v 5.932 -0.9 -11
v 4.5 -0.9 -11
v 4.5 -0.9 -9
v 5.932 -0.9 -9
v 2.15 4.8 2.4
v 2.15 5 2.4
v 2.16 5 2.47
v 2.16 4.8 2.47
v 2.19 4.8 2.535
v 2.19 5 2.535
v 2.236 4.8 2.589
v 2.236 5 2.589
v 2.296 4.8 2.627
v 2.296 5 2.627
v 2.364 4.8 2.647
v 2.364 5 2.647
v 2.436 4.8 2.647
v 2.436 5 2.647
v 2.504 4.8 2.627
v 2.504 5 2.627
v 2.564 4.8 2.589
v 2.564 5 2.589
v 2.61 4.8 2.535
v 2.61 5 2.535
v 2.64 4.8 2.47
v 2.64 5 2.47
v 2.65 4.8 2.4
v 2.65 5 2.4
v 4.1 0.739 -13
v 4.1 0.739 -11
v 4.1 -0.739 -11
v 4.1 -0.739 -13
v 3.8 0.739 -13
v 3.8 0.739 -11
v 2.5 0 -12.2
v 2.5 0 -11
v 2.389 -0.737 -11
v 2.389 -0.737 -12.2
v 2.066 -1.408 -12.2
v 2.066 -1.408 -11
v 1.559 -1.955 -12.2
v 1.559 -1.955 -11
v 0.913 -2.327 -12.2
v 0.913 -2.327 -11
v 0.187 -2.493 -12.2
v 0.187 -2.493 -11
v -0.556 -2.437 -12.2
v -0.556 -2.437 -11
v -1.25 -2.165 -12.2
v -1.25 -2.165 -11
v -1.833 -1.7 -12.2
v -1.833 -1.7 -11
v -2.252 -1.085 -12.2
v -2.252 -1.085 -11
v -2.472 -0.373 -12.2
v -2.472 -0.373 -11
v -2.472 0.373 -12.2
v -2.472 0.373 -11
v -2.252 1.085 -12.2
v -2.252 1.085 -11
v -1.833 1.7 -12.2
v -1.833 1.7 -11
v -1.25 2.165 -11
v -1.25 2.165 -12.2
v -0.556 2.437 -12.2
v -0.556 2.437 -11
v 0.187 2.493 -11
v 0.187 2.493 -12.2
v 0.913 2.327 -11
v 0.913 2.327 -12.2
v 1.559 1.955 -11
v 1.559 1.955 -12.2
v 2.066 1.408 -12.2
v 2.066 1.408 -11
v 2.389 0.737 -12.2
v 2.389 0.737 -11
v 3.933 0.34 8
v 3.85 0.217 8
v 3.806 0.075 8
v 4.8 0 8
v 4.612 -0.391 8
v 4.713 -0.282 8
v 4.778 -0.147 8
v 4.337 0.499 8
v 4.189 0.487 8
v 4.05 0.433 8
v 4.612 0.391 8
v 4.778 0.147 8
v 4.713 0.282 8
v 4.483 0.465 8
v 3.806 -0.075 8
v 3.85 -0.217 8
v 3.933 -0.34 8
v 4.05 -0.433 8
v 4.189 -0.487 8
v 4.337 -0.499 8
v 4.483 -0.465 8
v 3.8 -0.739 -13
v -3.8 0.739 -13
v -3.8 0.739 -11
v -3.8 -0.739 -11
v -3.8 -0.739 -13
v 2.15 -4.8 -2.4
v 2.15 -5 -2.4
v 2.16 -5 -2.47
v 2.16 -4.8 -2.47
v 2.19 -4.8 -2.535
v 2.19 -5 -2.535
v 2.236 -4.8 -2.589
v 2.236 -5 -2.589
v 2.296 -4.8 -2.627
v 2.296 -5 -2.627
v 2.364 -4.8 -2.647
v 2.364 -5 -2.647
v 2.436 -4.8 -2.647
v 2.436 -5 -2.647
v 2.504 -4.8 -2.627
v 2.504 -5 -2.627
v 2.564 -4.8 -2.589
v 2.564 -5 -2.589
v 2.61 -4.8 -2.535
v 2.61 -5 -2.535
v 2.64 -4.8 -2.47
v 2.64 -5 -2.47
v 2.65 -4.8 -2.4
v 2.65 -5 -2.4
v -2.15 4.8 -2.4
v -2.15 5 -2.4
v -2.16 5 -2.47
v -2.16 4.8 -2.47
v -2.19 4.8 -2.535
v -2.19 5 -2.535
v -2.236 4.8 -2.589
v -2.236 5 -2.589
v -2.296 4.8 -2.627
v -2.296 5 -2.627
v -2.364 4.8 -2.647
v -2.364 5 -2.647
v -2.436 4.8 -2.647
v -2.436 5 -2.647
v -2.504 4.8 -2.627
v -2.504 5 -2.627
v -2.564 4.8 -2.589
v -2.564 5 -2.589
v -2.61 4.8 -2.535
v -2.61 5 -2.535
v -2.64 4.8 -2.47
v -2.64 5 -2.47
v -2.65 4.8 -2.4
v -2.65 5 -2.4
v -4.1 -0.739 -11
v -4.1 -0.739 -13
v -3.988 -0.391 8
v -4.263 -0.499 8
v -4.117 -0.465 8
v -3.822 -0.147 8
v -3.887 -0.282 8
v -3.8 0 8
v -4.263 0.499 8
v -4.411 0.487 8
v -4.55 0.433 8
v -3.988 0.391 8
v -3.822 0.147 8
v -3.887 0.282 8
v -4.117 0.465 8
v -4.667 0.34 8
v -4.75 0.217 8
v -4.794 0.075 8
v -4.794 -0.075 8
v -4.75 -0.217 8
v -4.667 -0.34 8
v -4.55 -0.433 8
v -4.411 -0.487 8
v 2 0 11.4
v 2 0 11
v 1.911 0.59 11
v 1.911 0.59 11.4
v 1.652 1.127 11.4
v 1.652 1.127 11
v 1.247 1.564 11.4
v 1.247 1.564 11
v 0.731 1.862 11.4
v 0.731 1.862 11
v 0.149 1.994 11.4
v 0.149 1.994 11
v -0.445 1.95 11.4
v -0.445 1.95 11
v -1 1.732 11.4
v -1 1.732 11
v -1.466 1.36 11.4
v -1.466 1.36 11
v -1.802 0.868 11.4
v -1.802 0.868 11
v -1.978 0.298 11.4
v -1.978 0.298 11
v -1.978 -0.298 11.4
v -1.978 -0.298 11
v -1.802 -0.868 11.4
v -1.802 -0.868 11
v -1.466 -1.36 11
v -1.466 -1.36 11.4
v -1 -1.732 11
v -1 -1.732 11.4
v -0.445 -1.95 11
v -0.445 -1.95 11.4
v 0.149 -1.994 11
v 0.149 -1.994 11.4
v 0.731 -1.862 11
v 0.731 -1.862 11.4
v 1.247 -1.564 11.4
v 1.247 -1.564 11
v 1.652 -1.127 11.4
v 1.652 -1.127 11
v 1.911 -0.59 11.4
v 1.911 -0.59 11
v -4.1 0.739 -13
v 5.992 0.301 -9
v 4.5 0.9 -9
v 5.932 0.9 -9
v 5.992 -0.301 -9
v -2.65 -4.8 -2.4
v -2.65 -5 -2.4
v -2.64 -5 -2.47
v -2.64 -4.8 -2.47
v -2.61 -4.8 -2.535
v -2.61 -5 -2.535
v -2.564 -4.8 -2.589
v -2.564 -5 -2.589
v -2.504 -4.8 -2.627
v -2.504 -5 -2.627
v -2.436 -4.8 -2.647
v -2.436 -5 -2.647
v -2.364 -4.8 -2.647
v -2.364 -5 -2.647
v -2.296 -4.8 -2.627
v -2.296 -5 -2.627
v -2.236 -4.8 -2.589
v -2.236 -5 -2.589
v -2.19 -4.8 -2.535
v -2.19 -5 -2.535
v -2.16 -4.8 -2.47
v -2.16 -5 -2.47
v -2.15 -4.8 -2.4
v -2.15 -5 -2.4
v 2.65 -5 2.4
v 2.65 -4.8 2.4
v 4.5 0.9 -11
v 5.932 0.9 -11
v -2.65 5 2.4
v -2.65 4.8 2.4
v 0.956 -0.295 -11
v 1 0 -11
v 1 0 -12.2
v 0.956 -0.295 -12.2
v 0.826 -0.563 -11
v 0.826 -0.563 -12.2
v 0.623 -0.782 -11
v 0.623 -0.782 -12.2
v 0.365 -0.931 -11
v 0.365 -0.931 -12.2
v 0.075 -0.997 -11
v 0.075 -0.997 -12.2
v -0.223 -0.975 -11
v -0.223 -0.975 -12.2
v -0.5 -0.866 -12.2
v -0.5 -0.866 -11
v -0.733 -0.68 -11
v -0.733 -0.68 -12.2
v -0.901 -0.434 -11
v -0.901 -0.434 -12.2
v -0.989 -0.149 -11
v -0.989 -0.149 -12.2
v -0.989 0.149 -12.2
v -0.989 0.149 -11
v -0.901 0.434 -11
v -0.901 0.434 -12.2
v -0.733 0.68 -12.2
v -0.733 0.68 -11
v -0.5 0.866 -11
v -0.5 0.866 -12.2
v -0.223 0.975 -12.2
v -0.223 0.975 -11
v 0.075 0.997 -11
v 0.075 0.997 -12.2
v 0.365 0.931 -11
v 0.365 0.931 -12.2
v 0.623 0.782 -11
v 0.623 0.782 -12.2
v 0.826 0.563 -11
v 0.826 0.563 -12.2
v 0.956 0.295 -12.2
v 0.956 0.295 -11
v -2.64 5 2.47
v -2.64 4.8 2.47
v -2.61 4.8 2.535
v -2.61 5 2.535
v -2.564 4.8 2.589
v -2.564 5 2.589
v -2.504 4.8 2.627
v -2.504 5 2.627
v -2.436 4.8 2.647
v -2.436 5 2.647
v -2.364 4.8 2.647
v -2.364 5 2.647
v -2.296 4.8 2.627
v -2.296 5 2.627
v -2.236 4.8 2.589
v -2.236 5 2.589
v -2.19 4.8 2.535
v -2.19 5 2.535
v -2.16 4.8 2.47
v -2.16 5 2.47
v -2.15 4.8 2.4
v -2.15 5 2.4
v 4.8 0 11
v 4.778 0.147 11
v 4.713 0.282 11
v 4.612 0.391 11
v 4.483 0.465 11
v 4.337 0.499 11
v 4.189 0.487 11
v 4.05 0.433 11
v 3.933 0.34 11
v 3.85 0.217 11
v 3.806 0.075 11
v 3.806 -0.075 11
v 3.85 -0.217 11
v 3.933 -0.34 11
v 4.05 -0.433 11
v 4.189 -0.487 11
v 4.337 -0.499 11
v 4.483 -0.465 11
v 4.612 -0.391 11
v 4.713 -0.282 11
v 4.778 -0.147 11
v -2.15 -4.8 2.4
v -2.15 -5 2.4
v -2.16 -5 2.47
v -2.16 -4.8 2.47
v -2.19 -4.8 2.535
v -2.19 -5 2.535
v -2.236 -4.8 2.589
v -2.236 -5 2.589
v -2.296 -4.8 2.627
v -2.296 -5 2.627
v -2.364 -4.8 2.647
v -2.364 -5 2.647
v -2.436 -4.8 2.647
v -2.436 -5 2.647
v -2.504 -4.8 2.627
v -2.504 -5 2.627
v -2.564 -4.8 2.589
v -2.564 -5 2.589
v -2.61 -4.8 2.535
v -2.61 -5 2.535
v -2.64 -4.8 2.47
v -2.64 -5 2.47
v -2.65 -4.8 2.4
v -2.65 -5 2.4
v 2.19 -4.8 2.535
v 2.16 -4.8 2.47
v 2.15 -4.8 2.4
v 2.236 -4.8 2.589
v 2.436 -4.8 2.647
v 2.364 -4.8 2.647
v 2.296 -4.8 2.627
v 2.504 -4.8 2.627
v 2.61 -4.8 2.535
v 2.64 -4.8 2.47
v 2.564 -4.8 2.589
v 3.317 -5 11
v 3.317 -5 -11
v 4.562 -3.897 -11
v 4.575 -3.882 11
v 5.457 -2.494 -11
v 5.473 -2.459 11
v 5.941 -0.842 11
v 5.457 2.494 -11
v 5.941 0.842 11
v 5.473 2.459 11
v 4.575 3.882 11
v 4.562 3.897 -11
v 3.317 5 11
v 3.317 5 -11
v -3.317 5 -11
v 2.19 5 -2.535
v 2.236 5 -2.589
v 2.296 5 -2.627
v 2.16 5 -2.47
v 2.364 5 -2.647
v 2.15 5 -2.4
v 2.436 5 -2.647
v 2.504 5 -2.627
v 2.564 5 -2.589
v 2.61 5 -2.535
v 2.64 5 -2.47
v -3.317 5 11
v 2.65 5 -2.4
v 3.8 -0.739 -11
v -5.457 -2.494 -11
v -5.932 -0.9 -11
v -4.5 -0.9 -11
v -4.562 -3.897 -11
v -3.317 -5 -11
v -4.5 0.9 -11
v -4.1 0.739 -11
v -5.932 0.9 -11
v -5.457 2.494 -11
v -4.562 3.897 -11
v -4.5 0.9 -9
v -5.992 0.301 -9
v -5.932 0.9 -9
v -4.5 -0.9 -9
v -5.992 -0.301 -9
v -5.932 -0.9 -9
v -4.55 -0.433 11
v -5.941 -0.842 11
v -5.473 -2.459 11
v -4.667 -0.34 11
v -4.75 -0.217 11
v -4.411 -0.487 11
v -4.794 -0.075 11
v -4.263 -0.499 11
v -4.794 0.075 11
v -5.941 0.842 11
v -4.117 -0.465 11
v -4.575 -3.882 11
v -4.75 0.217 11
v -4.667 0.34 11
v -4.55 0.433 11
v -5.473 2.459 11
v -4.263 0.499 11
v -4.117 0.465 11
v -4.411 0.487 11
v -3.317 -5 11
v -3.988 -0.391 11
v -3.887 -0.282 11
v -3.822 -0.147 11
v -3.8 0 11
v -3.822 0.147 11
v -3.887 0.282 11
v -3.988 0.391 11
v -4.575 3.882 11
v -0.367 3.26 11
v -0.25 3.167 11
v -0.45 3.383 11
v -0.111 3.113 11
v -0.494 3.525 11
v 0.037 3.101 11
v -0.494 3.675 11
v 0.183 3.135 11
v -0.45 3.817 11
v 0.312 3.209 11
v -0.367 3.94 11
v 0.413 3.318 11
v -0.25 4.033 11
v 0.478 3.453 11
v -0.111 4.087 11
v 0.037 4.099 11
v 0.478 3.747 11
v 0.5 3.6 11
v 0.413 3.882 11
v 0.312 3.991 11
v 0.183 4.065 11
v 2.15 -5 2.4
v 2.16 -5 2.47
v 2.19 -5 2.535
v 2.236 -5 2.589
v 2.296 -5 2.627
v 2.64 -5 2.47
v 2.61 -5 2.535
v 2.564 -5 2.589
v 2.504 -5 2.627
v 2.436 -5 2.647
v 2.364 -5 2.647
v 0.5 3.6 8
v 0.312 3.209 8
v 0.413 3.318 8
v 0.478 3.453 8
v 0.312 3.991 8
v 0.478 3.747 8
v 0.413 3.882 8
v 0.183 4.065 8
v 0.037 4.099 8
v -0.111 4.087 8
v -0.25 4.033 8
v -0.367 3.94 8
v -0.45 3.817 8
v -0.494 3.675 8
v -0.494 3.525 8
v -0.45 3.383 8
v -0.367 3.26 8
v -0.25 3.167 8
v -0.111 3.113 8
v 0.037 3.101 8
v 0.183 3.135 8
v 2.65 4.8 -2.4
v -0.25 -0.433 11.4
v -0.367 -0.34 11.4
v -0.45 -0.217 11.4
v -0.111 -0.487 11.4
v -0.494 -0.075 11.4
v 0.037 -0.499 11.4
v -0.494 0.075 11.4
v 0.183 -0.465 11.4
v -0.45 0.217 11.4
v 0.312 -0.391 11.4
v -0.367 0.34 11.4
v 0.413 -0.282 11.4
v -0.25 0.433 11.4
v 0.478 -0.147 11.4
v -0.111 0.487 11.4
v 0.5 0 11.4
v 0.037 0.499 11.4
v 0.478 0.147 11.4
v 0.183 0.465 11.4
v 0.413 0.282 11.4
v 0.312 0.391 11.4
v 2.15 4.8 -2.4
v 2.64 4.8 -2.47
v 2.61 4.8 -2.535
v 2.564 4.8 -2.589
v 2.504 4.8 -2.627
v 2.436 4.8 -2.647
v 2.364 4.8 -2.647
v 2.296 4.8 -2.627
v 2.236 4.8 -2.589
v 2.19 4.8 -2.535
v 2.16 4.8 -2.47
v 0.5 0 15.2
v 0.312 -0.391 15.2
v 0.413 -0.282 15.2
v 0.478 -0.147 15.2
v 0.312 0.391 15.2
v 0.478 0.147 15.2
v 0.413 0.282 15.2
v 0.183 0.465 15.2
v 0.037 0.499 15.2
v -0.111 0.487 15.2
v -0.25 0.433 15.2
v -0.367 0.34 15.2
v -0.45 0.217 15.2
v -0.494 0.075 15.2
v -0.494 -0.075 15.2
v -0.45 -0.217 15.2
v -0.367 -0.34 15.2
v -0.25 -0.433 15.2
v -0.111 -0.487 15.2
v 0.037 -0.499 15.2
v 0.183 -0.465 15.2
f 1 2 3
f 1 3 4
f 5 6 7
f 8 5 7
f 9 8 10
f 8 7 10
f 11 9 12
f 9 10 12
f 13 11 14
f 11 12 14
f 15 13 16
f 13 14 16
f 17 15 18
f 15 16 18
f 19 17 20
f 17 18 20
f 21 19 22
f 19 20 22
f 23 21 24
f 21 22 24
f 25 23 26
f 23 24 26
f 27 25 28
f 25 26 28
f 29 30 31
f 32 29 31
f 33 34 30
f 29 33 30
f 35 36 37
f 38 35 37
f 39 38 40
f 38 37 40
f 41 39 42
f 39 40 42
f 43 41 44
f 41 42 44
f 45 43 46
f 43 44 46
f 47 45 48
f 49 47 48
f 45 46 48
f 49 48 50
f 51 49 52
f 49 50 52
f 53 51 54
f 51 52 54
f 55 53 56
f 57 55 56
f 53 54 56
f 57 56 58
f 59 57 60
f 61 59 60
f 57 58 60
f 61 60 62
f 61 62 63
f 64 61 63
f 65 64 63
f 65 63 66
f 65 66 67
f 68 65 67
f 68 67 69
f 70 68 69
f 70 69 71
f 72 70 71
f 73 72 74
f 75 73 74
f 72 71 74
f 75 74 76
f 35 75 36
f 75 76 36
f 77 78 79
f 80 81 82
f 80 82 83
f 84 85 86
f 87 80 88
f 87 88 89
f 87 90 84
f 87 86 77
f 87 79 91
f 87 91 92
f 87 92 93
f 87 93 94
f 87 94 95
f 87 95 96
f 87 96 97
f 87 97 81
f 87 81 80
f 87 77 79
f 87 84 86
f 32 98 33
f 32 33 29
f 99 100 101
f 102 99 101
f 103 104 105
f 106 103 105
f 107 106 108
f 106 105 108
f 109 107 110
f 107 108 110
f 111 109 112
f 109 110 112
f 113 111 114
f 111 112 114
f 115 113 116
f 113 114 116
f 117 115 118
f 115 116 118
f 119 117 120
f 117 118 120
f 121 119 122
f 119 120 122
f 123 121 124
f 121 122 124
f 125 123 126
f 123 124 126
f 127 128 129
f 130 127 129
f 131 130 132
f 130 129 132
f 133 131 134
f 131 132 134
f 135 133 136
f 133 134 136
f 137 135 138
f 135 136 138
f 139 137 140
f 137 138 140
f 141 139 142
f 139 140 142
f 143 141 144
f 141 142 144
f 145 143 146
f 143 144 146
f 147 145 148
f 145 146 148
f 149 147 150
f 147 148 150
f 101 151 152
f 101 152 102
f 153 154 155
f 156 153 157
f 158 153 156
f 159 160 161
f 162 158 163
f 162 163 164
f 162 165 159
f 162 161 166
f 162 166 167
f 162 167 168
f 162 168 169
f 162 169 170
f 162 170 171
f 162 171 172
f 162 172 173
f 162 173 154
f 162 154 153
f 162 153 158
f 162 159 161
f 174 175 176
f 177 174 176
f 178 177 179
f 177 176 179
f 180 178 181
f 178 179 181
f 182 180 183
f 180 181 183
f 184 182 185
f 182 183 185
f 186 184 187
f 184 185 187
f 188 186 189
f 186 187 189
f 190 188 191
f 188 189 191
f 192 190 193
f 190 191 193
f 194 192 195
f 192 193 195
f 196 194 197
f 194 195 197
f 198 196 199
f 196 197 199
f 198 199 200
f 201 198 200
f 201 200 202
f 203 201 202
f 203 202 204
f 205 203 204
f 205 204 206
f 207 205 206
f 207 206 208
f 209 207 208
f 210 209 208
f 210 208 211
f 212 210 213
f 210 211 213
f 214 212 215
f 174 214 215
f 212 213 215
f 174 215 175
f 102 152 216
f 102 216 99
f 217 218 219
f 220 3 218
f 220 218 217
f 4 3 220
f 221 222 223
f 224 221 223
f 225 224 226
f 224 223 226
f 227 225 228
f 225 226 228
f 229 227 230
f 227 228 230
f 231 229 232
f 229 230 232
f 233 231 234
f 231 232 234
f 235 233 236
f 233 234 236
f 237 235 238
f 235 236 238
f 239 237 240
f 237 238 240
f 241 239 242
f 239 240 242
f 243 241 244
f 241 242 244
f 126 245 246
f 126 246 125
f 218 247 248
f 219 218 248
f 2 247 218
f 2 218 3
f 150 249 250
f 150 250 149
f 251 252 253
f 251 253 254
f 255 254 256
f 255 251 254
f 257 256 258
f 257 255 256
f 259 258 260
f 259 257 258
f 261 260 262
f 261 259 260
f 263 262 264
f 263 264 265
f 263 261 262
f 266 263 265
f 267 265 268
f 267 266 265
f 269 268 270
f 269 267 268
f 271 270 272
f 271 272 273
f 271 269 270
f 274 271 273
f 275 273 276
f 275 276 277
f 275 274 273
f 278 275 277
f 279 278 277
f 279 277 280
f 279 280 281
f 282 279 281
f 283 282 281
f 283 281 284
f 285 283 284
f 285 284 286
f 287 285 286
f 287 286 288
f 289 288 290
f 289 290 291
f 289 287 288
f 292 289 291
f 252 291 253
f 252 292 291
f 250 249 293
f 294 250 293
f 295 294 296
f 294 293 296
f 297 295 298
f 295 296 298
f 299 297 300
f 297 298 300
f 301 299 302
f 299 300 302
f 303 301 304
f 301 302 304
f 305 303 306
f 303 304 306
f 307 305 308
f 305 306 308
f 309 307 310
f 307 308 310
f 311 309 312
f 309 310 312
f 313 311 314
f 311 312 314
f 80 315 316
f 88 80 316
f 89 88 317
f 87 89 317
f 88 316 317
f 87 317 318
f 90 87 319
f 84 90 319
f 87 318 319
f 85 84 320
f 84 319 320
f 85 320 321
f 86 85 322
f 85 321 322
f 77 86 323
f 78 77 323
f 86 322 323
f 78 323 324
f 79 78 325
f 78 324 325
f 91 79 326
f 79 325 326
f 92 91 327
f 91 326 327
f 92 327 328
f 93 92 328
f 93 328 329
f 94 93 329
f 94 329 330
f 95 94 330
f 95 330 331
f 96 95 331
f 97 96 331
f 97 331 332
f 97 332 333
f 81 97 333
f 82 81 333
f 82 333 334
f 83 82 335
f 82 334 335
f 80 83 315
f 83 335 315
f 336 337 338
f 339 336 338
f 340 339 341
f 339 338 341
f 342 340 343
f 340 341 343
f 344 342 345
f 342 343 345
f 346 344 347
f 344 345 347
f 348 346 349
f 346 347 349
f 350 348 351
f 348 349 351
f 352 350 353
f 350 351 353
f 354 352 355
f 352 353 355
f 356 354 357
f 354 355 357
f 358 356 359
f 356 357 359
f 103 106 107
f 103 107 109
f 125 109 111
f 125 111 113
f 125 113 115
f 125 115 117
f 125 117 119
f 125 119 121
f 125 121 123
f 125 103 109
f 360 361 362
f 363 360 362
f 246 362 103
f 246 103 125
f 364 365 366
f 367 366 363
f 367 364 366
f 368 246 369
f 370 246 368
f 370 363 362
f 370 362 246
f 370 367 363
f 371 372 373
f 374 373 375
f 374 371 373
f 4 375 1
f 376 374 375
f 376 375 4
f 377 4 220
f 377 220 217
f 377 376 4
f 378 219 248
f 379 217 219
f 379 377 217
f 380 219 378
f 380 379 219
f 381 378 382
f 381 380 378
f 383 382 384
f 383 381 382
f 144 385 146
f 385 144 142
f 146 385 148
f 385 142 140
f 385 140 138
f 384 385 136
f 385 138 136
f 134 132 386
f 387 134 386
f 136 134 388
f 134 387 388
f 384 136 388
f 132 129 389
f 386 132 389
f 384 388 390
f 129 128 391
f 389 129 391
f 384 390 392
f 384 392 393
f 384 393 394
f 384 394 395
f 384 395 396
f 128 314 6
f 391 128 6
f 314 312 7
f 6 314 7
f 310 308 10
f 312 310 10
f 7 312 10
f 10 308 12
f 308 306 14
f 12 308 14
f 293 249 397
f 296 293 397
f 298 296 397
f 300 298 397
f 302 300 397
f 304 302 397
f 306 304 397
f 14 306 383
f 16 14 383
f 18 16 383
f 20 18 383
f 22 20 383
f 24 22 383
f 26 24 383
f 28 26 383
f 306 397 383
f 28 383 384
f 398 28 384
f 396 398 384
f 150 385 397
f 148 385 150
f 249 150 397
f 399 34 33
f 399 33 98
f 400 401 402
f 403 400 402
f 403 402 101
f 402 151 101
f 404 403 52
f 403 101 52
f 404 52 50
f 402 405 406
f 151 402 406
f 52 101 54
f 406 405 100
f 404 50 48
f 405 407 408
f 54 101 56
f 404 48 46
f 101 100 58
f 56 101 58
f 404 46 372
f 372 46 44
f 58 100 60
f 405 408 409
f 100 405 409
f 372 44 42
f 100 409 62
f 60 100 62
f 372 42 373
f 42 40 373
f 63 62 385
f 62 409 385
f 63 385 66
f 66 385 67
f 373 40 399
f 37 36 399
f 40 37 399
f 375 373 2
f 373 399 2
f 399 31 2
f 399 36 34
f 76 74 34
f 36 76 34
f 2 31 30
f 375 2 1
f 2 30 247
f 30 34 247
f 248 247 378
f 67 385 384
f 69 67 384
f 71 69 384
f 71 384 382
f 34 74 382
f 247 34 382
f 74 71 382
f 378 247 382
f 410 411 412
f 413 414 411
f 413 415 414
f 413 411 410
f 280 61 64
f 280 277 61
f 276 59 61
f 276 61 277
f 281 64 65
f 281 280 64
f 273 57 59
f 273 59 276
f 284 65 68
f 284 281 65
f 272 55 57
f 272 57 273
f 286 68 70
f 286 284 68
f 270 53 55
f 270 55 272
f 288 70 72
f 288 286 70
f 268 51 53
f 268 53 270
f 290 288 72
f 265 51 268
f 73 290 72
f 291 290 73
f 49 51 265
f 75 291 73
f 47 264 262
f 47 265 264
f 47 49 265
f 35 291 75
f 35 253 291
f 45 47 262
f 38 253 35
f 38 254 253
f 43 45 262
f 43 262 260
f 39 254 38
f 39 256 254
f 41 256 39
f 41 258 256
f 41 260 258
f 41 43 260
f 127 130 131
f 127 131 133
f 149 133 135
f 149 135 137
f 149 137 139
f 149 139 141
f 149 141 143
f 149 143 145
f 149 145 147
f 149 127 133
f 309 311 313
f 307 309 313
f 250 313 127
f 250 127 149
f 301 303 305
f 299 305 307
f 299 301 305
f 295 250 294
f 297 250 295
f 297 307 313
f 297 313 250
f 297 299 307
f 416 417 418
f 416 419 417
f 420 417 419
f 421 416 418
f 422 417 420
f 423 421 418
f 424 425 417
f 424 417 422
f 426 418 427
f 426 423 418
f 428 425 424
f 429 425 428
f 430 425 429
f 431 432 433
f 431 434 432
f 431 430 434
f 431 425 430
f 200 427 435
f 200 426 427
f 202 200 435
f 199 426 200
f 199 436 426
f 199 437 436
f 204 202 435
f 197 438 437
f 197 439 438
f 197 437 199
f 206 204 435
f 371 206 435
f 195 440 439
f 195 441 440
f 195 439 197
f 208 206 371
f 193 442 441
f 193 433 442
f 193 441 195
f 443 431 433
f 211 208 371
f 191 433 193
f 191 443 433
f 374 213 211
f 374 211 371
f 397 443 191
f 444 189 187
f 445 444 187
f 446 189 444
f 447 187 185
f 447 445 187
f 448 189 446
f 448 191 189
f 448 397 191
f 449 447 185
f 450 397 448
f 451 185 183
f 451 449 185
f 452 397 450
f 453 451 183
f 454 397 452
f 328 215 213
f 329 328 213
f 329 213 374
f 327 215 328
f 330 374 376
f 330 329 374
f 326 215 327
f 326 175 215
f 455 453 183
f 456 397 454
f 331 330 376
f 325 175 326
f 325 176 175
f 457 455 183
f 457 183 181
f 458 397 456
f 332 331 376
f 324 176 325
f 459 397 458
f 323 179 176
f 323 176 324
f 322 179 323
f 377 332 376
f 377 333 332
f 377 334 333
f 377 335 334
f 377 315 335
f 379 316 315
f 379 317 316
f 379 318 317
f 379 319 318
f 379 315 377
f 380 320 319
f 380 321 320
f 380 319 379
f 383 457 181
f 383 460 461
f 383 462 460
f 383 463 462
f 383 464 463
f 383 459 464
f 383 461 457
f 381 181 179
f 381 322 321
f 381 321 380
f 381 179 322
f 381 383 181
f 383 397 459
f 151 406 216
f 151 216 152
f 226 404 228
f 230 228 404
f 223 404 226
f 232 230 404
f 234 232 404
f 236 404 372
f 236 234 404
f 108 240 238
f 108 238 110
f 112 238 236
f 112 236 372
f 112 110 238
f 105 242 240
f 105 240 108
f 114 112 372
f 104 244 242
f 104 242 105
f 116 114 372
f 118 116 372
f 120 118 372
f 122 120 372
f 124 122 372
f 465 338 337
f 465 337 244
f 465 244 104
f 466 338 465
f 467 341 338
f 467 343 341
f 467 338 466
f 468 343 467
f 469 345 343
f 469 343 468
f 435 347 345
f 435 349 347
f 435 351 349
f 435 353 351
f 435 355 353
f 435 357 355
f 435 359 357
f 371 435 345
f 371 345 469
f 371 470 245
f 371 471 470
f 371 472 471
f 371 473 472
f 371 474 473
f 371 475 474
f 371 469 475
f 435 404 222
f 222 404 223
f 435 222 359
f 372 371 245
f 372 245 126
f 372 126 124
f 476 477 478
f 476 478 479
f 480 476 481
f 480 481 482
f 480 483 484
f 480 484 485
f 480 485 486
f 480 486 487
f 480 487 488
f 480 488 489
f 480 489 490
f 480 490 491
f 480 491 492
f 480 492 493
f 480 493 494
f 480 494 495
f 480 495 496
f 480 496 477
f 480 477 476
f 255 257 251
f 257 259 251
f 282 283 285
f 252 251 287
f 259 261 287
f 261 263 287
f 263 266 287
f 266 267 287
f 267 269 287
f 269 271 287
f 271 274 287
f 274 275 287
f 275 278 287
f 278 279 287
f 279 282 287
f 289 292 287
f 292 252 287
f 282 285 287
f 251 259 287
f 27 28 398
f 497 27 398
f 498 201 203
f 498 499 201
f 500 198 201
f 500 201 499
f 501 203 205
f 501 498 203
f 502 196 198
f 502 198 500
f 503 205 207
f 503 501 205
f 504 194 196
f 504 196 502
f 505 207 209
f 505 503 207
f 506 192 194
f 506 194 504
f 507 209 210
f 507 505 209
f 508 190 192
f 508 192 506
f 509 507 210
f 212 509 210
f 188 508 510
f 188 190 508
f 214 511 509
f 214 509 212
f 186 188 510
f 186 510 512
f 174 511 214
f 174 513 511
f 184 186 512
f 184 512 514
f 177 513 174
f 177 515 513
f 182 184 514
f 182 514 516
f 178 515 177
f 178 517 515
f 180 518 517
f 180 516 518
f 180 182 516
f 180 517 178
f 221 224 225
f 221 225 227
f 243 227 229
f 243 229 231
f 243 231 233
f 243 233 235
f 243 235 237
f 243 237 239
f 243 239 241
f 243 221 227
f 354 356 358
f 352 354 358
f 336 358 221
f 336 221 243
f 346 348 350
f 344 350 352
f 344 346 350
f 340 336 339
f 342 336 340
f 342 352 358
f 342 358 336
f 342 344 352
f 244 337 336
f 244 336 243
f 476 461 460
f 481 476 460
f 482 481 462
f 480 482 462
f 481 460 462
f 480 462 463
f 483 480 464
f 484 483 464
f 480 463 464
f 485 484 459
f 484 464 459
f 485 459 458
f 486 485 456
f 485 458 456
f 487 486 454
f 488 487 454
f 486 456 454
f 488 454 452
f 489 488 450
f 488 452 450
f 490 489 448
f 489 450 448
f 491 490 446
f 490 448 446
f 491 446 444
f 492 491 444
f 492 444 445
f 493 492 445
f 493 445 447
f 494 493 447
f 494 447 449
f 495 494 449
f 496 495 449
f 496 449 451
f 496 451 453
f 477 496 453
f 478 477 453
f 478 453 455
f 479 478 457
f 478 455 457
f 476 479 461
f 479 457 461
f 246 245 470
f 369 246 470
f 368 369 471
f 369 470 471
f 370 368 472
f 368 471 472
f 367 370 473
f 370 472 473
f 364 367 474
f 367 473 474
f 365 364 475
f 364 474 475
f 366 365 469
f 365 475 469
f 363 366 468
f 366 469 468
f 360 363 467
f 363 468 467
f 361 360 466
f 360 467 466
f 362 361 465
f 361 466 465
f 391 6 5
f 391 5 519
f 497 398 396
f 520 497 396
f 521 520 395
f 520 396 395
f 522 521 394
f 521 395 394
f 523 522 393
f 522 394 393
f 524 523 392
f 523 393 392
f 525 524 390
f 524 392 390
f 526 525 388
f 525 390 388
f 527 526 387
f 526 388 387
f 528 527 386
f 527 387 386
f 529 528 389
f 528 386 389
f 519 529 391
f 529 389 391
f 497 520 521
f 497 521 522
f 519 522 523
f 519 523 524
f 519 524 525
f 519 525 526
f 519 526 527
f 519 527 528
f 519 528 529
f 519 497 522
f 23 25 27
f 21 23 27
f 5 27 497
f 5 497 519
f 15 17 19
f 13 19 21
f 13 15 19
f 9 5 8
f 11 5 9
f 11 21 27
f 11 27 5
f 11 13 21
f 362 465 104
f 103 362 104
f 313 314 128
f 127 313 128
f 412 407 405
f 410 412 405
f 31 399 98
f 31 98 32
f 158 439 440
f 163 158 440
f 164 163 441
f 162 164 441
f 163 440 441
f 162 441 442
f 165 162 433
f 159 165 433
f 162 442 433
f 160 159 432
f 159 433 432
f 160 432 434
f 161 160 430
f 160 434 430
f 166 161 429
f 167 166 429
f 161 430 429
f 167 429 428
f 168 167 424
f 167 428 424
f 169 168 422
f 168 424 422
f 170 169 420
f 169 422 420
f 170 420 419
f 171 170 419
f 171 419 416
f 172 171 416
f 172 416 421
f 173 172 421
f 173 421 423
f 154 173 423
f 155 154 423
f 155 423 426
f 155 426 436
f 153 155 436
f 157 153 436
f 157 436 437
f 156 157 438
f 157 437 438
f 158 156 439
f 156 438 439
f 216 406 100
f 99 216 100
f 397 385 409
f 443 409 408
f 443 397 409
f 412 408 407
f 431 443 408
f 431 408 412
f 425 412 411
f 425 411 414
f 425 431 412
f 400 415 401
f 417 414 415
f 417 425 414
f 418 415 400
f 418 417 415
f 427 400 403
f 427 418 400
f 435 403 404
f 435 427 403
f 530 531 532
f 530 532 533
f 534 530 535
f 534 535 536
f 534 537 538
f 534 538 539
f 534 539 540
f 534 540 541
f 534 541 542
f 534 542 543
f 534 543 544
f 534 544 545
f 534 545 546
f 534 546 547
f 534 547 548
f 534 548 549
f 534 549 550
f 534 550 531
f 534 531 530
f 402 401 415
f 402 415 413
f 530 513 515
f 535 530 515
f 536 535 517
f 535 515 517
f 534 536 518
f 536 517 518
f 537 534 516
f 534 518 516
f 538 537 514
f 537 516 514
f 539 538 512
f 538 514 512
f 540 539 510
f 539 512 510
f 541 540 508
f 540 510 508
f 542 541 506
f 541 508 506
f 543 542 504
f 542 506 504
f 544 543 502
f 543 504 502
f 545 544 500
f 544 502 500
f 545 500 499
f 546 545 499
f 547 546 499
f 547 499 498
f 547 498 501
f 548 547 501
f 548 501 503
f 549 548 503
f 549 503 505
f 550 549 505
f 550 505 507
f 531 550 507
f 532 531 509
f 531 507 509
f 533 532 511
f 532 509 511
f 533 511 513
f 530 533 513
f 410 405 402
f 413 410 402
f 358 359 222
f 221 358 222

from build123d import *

# Parameters (mm, degrees)
PAD_DEPTH          = 11
SKETCH001_R        = 2
PAD001_DEPTH       = 0.4
SKETCH002_R        = 0.5
PAD002_DEPTH       = 3.8
SKETCH003_R        = 0.5
POCKET_DEPTH       = 3
SKETCH004_R        = 2.5
SKETCH004_R_2      = 1
PAD003_DEPTH       = 1.2
SKETCH005_W        = 3
SKETCH005_H        = 1.8
POCKET001_DEPTH    = 2
SKETCH006_W        = 0.3
SKETCH006_H        = 1.478048
PAD004_DEPTH       = 2
POCKET002_DEPTH    = 0.2
POLARPATTERN_COUNT = 2


with BuildPart() as part:
    # Sketch → Pad (new body, symmetric)
    with BuildSketch(Plane.XY):
        with BuildLine():
            ThreePointArc((-3.316625, 5), (-6, 0), (-3.316625, -5))
            Line((-3.316625, -5), (3.316625, -5))
            ThreePointArc((3.316625, -5), (6, 0), (3.316625, 5))
            Line((-3.316625, 5), (3.316625, 5))
        make_face()
    extrude(amount=PAD_DEPTH, both=True)

    # Sketch001 (on Face6 of Pad) → Pad001 (join)
    with BuildSketch(Plane.XY.offset(11)):
        Circle(SKETCH001_R)
    extrude(amount=PAD001_DEPTH)

    # Sketch002 (on Face8 of Pad001) → Pad002 (join)
    with BuildSketch(Plane.XY.offset(11.4)):
        Circle(SKETCH002_R)
    extrude(amount=PAD002_DEPTH)

    # Sketch003 (on Face5 of Pad002) → Pocket (cut)
    with BuildSketch(Plane.XY.offset(11)):
        with Locations((0, 3.6)):
            Circle(SKETCH003_R)
        with Locations((-4.3, 0)):
            Circle(SKETCH003_R)
        with Locations((4.3, 0)):
            Circle(SKETCH003_R)
    extrude(amount=-POCKET_DEPTH, mode=Mode.SUBTRACT)

    # Sketch004 (on Face4 of Pocket) → Pad003 (join)
    with BuildSketch(Plane(origin=(0, 0, -11), x_dir=(1, 0, 0), z_dir=(0, 0, -1))):
        Circle(SKETCH004_R)
        Circle(SKETCH004_R_2, mode=Mode.SUBTRACT)
    extrude(amount=PAD003_DEPTH)

    # Sketch005 (on Face4 of Pad003) → Pocket001 (cut)
    with BuildSketch(Plane(origin=(0, 0, -11), x_dir=(1, 0, 0), z_dir=(0, 0, -1))):
        with Locations((-6, 0)):
            Rectangle(SKETCH005_W, SKETCH005_H)
        with Locations((6, 0)):
            Rectangle(SKETCH005_W, SKETCH005_H)
    extrude(amount=-POCKET001_DEPTH, mode=Mode.SUBTRACT)

    # Sketch006 (on Face2 of Pocket001) → Pad004 (join)
    with BuildSketch(Plane(origin=(0, 0, -11), x_dir=(1, 0, 0), z_dir=(0, 0, -1))):
        with Locations((-3.95, 0)):
            Rectangle(SKETCH006_W, SKETCH006_H)
        with Locations((3.95, 0)):
            Rectangle(SKETCH006_W, SKETCH006_H)
    extrude(amount=PAD004_DEPTH)

    # Sketch007 (on Face6 of Pad004) → Pocket002 (cut)
    with BuildSketch(Plane.XZ.offset(5)):
        with BuildLine():
            ThreePointArc((-2.15, 2.4), (-2.4, 2.65), (-2.65, 2.4))
            Line((-2.65, 2.4), (-2.65, -2.4))
            ThreePointArc((-2.65, -2.4), (-2.4, -2.65), (-2.15, -2.4))
            Line((-2.15, 2.4), (-2.15, -2.4))
        make_face()
        with BuildLine():
            ThreePointArc((2.65, 2.4), (2.4, 2.65), (2.15, 2.4))
            Line((2.15, 2.4), (2.15, -2.4))
            ThreePointArc((2.15, -2.4), (2.4, -2.65), (2.65, -2.4))
            Line((2.65, 2.4), (2.65, -2.4))
        make_face()
    pocket002 = extrude(amount=-POCKET002_DEPTH, mode=Mode.SUBTRACT)

    # PolarPattern: Pocket002 ×2 about axis
    polarpattern_axis = Axis((0, 0, 0), (0, 0, 1))
    for i in range(1, POLARPATTERN_COUNT):
        add(pocket002.rotate(polarpattern_axis, i * 360 / POLARPATTERN_COUNT), mode=Mode.SUBTRACT)


solid = part.part
